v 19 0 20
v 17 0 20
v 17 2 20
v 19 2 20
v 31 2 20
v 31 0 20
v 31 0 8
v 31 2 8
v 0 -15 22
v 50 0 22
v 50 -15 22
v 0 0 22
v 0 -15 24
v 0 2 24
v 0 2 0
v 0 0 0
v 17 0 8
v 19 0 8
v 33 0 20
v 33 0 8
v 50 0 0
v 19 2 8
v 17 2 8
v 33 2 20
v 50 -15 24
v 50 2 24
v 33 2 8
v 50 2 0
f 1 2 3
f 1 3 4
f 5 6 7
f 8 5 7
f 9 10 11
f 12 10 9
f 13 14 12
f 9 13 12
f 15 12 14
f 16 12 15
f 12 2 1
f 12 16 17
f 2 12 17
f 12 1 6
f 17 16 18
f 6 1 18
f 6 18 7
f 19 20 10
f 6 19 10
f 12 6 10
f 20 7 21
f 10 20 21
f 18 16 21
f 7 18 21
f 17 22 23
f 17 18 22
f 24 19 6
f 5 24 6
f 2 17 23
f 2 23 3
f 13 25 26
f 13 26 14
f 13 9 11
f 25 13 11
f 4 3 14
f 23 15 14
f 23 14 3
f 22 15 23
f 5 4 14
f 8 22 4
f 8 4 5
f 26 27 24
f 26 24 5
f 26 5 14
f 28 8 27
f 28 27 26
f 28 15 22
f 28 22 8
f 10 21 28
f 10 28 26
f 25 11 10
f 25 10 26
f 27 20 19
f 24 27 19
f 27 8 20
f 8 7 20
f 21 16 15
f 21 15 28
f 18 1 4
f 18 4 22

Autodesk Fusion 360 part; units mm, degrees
sketch "Sketch1" plane through (0, 0, 0) normal (0, 1, 0) x (1, 0, 0)
  line L0 (0, 0) -> (50, 0)
  line L1 (50, 0) -> (50, -24)
  line L2 (50, -24) -> (0, -24)
  line L3 (0, -24) -> (0, 0)
extrude "Extrude1" add sketch "Sketch1" along normal blind 2
sketch "Sketch2" plane through (0, 0, 0) normal (0, 1, 0) x (1, 0, 0)
  line L0 (0, -24) -> (50, -24)
  line L1 (50, -24) -> (50, -22)
  line L2 (50, -22) -> (0, -22)
  line L3 (0, -22) -> (0, -24)
extrude "Extrude2" add sketch "Sketch2" against normal blind 15
sketch "Sketch3" plane through (0, 0, 0) normal (0, 1, 0) x (1, 0, 0)
  line L0 (17, -20) -> (19, -20)
  line L1 (19, -20) -> (19, -8)
  line L2 (19, -8) -> (17, -8)
  line L3 (17, -8) -> (17, -20)
extrude "Extrude3" cut sketch "Sketch3" along normal blind 5
sketch "Sketch4" plane through (0, 0, 0) normal (0, 1, 0) x (1, 0, 0)
  line L0 (33, -20) -> (31, -20)
  line L1 (31, -20) -> (31, -8)
  line L2 (31, -8) -> (33, -8)
  line L3 (33, -8) -> (33, -20)
extrude "Extrude4" cut sketch "Sketch4" along normal blind 3
